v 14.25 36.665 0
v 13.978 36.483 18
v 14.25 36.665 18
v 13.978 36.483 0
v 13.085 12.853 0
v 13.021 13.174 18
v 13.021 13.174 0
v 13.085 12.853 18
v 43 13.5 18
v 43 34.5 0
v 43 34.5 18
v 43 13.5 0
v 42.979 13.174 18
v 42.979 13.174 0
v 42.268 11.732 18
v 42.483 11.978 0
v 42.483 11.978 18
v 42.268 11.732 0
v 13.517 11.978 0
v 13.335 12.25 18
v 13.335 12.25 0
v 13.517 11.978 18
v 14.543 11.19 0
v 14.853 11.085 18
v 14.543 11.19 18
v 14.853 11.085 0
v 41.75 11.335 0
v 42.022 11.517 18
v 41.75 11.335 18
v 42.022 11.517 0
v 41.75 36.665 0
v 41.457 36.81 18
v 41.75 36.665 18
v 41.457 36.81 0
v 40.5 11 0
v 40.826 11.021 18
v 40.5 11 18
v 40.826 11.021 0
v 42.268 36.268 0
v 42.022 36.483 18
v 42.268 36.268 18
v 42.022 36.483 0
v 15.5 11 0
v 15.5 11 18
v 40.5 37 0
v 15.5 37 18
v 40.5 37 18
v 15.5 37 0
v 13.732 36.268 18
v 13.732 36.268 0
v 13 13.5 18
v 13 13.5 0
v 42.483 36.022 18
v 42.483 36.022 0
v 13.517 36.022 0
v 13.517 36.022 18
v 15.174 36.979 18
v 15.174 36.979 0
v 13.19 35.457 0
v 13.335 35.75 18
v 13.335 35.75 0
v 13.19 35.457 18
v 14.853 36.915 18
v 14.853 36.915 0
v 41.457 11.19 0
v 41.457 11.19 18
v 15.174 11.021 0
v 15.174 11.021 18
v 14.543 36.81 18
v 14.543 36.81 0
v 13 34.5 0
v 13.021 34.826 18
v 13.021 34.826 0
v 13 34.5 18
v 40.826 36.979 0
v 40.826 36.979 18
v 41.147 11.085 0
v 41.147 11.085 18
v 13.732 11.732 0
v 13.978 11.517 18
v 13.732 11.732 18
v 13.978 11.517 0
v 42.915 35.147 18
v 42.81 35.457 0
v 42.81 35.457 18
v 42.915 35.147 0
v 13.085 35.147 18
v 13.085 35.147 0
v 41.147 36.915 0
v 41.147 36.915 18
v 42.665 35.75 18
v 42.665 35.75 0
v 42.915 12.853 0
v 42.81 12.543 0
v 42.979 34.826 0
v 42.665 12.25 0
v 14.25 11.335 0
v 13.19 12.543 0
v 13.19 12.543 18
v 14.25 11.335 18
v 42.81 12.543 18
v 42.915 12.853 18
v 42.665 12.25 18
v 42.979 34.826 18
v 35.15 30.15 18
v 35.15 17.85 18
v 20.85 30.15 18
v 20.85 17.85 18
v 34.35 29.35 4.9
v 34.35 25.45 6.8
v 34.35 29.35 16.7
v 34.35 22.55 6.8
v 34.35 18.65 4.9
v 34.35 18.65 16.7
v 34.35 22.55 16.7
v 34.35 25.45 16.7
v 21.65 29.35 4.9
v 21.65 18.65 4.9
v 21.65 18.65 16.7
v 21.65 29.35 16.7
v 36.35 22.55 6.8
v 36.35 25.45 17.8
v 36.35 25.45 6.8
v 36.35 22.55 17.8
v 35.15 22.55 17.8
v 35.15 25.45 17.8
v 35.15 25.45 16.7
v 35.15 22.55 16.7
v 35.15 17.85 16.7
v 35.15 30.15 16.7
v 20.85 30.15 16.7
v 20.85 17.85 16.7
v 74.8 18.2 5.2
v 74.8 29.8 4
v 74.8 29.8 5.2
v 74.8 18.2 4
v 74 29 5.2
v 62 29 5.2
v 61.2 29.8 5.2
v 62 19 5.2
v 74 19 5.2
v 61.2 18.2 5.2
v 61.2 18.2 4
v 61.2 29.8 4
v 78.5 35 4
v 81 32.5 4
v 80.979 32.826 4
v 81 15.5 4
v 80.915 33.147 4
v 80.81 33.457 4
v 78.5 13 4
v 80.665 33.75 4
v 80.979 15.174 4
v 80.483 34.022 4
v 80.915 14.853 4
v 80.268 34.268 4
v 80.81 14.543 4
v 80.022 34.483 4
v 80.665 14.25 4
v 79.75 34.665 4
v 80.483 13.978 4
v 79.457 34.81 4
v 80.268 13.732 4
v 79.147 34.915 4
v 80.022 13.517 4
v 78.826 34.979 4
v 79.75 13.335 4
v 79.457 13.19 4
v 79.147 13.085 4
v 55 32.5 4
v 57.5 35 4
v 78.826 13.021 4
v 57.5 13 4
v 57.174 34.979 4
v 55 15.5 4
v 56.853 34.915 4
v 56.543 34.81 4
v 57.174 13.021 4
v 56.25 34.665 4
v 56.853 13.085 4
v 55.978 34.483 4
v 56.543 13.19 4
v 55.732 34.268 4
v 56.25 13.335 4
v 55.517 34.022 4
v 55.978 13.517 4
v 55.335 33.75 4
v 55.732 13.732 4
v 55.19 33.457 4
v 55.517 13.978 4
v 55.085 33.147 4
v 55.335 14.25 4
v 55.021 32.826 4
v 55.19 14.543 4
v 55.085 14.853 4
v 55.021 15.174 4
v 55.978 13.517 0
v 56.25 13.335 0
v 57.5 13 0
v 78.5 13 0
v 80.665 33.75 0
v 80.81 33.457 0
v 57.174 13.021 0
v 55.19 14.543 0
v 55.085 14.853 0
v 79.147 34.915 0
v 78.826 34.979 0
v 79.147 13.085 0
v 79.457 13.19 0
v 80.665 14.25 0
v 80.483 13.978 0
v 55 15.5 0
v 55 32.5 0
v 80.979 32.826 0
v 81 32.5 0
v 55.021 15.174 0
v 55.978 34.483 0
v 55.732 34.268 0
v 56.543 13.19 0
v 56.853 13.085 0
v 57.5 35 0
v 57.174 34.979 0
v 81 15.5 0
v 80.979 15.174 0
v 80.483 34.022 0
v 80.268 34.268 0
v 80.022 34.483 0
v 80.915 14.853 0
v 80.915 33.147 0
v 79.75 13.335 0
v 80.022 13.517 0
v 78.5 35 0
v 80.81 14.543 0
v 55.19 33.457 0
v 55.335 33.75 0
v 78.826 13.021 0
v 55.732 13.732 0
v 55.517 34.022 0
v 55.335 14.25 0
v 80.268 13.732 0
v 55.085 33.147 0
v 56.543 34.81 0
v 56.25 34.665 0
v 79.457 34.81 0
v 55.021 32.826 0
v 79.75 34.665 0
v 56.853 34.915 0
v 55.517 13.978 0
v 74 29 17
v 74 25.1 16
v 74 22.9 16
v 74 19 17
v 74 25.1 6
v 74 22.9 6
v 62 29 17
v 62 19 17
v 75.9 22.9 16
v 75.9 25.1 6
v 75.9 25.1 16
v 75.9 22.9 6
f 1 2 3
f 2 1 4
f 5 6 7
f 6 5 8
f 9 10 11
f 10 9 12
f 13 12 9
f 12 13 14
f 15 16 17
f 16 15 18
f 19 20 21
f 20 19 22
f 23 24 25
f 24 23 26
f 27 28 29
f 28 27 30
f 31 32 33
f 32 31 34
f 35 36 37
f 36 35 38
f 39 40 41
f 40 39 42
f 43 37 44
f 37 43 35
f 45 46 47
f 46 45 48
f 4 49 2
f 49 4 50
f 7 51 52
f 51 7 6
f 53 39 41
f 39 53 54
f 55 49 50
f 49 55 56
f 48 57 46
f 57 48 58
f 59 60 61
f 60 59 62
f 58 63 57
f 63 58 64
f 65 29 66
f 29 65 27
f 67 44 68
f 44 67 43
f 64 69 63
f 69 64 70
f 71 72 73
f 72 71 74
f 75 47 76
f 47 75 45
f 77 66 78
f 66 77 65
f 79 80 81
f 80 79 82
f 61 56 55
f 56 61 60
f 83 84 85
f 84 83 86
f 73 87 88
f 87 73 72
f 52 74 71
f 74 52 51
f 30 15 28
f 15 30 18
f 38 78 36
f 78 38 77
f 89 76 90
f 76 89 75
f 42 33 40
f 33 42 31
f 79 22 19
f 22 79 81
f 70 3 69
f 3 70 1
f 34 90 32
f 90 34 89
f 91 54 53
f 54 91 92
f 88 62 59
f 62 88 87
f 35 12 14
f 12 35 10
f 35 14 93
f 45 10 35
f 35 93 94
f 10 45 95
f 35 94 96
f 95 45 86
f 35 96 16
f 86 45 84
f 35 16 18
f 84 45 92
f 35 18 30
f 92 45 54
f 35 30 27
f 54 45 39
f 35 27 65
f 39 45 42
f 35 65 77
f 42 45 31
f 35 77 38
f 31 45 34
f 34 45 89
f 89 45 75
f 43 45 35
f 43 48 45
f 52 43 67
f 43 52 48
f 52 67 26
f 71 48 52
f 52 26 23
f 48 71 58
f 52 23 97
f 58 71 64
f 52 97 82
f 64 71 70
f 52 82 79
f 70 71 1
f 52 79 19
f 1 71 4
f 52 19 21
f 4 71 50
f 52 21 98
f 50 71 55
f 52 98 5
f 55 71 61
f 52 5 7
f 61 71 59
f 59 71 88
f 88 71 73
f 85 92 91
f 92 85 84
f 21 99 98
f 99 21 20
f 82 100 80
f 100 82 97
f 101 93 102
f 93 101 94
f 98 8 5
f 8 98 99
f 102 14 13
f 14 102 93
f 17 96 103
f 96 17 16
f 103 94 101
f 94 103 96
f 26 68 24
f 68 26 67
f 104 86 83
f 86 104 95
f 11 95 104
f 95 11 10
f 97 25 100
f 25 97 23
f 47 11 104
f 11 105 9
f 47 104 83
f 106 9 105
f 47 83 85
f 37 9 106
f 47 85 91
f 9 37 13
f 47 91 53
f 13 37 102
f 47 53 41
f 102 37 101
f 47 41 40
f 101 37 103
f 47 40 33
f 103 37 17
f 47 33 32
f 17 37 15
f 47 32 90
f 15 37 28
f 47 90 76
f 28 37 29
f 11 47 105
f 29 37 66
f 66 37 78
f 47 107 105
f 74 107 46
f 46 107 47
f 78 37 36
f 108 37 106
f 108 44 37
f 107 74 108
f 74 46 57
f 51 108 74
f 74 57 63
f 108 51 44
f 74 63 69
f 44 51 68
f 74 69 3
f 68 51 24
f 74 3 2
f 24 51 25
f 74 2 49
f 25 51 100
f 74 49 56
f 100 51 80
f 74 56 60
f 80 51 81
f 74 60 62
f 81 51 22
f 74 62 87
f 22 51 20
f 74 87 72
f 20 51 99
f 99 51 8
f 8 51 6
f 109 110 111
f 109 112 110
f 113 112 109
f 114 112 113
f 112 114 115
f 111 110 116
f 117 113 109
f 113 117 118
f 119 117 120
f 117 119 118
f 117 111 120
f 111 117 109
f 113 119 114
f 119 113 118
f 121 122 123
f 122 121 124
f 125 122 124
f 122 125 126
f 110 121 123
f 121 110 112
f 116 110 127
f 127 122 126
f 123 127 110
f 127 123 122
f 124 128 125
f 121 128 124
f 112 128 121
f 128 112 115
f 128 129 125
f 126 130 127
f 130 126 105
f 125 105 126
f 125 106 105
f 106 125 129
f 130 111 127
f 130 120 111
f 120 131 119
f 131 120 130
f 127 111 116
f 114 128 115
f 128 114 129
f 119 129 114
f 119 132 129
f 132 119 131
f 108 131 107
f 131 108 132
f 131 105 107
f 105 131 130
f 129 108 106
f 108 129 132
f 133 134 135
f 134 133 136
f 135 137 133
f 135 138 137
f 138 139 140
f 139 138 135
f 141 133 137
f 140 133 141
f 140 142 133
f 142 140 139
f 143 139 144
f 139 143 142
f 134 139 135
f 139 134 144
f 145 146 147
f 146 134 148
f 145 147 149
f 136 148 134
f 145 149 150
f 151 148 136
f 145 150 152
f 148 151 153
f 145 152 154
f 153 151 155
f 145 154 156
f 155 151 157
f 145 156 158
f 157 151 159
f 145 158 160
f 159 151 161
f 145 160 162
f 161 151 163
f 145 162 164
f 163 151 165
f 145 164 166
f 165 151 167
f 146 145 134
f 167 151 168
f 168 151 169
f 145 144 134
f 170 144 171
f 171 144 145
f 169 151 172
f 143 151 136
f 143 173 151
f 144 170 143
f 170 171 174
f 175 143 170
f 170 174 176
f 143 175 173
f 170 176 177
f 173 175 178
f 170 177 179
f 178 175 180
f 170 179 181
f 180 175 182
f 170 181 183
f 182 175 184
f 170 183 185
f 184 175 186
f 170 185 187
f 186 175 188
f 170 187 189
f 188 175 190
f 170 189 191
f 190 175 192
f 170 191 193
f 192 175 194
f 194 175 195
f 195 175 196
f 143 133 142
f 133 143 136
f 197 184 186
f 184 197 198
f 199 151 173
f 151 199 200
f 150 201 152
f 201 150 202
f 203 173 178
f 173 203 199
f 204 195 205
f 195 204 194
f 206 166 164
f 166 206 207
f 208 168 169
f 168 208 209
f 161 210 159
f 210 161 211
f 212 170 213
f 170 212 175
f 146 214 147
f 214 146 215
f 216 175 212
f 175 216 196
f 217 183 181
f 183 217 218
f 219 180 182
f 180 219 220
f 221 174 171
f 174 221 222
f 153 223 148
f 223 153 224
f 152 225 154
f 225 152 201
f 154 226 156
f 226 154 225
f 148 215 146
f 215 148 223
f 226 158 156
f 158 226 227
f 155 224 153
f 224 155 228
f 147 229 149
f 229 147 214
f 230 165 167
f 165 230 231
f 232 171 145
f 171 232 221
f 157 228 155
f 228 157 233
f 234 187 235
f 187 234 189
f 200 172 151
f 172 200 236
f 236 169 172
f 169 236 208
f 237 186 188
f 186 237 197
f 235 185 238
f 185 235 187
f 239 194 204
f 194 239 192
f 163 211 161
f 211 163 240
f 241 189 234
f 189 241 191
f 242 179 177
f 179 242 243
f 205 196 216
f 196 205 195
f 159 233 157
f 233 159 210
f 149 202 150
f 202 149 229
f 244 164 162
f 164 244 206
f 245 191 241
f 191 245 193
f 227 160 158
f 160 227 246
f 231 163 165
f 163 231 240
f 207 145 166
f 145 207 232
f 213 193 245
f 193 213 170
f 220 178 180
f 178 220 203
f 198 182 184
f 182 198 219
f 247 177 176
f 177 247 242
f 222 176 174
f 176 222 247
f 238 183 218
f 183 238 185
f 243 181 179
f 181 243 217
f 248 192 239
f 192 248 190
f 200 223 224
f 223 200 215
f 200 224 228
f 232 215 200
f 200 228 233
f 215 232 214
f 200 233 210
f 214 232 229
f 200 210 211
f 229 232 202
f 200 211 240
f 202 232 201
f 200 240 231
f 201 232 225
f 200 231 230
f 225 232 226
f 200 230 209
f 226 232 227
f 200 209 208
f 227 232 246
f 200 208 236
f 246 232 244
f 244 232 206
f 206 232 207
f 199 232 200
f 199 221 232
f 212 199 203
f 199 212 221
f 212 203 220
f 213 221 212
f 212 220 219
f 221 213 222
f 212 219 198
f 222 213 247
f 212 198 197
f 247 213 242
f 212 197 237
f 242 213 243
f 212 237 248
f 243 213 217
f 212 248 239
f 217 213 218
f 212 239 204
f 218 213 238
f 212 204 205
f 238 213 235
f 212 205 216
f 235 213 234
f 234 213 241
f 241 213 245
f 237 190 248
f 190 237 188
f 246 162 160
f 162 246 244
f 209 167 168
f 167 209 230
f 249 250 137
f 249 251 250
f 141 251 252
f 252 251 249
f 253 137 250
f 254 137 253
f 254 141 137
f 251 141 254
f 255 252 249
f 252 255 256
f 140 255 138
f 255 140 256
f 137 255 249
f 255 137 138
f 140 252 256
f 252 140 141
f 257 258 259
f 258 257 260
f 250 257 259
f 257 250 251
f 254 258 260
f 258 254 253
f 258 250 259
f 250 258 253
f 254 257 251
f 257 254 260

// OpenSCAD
/*
Sample 043: Verdrehsichere Schlüssel-Steckverbindung — 0,35 mm
Generated from the FDM Mechanical Sample Library.
Units: millimetres.

Override examples:
  openscad -o custom.stl -D 'view="plate"' -D 'render_fn=64' model.scad
  openscad -o preview.png -D 'view="assembly"' model.scad
*/
use <../../../library/fdm_mechanisms.scad>

render_fn = is_undef(render_fn) ? 48 : render_fn;
view = is_undef(view) ? "plate" : view;
$fn = render_fn;

sample_keyed_plug_socket(
    view=view,
    clearance=0.35
);
